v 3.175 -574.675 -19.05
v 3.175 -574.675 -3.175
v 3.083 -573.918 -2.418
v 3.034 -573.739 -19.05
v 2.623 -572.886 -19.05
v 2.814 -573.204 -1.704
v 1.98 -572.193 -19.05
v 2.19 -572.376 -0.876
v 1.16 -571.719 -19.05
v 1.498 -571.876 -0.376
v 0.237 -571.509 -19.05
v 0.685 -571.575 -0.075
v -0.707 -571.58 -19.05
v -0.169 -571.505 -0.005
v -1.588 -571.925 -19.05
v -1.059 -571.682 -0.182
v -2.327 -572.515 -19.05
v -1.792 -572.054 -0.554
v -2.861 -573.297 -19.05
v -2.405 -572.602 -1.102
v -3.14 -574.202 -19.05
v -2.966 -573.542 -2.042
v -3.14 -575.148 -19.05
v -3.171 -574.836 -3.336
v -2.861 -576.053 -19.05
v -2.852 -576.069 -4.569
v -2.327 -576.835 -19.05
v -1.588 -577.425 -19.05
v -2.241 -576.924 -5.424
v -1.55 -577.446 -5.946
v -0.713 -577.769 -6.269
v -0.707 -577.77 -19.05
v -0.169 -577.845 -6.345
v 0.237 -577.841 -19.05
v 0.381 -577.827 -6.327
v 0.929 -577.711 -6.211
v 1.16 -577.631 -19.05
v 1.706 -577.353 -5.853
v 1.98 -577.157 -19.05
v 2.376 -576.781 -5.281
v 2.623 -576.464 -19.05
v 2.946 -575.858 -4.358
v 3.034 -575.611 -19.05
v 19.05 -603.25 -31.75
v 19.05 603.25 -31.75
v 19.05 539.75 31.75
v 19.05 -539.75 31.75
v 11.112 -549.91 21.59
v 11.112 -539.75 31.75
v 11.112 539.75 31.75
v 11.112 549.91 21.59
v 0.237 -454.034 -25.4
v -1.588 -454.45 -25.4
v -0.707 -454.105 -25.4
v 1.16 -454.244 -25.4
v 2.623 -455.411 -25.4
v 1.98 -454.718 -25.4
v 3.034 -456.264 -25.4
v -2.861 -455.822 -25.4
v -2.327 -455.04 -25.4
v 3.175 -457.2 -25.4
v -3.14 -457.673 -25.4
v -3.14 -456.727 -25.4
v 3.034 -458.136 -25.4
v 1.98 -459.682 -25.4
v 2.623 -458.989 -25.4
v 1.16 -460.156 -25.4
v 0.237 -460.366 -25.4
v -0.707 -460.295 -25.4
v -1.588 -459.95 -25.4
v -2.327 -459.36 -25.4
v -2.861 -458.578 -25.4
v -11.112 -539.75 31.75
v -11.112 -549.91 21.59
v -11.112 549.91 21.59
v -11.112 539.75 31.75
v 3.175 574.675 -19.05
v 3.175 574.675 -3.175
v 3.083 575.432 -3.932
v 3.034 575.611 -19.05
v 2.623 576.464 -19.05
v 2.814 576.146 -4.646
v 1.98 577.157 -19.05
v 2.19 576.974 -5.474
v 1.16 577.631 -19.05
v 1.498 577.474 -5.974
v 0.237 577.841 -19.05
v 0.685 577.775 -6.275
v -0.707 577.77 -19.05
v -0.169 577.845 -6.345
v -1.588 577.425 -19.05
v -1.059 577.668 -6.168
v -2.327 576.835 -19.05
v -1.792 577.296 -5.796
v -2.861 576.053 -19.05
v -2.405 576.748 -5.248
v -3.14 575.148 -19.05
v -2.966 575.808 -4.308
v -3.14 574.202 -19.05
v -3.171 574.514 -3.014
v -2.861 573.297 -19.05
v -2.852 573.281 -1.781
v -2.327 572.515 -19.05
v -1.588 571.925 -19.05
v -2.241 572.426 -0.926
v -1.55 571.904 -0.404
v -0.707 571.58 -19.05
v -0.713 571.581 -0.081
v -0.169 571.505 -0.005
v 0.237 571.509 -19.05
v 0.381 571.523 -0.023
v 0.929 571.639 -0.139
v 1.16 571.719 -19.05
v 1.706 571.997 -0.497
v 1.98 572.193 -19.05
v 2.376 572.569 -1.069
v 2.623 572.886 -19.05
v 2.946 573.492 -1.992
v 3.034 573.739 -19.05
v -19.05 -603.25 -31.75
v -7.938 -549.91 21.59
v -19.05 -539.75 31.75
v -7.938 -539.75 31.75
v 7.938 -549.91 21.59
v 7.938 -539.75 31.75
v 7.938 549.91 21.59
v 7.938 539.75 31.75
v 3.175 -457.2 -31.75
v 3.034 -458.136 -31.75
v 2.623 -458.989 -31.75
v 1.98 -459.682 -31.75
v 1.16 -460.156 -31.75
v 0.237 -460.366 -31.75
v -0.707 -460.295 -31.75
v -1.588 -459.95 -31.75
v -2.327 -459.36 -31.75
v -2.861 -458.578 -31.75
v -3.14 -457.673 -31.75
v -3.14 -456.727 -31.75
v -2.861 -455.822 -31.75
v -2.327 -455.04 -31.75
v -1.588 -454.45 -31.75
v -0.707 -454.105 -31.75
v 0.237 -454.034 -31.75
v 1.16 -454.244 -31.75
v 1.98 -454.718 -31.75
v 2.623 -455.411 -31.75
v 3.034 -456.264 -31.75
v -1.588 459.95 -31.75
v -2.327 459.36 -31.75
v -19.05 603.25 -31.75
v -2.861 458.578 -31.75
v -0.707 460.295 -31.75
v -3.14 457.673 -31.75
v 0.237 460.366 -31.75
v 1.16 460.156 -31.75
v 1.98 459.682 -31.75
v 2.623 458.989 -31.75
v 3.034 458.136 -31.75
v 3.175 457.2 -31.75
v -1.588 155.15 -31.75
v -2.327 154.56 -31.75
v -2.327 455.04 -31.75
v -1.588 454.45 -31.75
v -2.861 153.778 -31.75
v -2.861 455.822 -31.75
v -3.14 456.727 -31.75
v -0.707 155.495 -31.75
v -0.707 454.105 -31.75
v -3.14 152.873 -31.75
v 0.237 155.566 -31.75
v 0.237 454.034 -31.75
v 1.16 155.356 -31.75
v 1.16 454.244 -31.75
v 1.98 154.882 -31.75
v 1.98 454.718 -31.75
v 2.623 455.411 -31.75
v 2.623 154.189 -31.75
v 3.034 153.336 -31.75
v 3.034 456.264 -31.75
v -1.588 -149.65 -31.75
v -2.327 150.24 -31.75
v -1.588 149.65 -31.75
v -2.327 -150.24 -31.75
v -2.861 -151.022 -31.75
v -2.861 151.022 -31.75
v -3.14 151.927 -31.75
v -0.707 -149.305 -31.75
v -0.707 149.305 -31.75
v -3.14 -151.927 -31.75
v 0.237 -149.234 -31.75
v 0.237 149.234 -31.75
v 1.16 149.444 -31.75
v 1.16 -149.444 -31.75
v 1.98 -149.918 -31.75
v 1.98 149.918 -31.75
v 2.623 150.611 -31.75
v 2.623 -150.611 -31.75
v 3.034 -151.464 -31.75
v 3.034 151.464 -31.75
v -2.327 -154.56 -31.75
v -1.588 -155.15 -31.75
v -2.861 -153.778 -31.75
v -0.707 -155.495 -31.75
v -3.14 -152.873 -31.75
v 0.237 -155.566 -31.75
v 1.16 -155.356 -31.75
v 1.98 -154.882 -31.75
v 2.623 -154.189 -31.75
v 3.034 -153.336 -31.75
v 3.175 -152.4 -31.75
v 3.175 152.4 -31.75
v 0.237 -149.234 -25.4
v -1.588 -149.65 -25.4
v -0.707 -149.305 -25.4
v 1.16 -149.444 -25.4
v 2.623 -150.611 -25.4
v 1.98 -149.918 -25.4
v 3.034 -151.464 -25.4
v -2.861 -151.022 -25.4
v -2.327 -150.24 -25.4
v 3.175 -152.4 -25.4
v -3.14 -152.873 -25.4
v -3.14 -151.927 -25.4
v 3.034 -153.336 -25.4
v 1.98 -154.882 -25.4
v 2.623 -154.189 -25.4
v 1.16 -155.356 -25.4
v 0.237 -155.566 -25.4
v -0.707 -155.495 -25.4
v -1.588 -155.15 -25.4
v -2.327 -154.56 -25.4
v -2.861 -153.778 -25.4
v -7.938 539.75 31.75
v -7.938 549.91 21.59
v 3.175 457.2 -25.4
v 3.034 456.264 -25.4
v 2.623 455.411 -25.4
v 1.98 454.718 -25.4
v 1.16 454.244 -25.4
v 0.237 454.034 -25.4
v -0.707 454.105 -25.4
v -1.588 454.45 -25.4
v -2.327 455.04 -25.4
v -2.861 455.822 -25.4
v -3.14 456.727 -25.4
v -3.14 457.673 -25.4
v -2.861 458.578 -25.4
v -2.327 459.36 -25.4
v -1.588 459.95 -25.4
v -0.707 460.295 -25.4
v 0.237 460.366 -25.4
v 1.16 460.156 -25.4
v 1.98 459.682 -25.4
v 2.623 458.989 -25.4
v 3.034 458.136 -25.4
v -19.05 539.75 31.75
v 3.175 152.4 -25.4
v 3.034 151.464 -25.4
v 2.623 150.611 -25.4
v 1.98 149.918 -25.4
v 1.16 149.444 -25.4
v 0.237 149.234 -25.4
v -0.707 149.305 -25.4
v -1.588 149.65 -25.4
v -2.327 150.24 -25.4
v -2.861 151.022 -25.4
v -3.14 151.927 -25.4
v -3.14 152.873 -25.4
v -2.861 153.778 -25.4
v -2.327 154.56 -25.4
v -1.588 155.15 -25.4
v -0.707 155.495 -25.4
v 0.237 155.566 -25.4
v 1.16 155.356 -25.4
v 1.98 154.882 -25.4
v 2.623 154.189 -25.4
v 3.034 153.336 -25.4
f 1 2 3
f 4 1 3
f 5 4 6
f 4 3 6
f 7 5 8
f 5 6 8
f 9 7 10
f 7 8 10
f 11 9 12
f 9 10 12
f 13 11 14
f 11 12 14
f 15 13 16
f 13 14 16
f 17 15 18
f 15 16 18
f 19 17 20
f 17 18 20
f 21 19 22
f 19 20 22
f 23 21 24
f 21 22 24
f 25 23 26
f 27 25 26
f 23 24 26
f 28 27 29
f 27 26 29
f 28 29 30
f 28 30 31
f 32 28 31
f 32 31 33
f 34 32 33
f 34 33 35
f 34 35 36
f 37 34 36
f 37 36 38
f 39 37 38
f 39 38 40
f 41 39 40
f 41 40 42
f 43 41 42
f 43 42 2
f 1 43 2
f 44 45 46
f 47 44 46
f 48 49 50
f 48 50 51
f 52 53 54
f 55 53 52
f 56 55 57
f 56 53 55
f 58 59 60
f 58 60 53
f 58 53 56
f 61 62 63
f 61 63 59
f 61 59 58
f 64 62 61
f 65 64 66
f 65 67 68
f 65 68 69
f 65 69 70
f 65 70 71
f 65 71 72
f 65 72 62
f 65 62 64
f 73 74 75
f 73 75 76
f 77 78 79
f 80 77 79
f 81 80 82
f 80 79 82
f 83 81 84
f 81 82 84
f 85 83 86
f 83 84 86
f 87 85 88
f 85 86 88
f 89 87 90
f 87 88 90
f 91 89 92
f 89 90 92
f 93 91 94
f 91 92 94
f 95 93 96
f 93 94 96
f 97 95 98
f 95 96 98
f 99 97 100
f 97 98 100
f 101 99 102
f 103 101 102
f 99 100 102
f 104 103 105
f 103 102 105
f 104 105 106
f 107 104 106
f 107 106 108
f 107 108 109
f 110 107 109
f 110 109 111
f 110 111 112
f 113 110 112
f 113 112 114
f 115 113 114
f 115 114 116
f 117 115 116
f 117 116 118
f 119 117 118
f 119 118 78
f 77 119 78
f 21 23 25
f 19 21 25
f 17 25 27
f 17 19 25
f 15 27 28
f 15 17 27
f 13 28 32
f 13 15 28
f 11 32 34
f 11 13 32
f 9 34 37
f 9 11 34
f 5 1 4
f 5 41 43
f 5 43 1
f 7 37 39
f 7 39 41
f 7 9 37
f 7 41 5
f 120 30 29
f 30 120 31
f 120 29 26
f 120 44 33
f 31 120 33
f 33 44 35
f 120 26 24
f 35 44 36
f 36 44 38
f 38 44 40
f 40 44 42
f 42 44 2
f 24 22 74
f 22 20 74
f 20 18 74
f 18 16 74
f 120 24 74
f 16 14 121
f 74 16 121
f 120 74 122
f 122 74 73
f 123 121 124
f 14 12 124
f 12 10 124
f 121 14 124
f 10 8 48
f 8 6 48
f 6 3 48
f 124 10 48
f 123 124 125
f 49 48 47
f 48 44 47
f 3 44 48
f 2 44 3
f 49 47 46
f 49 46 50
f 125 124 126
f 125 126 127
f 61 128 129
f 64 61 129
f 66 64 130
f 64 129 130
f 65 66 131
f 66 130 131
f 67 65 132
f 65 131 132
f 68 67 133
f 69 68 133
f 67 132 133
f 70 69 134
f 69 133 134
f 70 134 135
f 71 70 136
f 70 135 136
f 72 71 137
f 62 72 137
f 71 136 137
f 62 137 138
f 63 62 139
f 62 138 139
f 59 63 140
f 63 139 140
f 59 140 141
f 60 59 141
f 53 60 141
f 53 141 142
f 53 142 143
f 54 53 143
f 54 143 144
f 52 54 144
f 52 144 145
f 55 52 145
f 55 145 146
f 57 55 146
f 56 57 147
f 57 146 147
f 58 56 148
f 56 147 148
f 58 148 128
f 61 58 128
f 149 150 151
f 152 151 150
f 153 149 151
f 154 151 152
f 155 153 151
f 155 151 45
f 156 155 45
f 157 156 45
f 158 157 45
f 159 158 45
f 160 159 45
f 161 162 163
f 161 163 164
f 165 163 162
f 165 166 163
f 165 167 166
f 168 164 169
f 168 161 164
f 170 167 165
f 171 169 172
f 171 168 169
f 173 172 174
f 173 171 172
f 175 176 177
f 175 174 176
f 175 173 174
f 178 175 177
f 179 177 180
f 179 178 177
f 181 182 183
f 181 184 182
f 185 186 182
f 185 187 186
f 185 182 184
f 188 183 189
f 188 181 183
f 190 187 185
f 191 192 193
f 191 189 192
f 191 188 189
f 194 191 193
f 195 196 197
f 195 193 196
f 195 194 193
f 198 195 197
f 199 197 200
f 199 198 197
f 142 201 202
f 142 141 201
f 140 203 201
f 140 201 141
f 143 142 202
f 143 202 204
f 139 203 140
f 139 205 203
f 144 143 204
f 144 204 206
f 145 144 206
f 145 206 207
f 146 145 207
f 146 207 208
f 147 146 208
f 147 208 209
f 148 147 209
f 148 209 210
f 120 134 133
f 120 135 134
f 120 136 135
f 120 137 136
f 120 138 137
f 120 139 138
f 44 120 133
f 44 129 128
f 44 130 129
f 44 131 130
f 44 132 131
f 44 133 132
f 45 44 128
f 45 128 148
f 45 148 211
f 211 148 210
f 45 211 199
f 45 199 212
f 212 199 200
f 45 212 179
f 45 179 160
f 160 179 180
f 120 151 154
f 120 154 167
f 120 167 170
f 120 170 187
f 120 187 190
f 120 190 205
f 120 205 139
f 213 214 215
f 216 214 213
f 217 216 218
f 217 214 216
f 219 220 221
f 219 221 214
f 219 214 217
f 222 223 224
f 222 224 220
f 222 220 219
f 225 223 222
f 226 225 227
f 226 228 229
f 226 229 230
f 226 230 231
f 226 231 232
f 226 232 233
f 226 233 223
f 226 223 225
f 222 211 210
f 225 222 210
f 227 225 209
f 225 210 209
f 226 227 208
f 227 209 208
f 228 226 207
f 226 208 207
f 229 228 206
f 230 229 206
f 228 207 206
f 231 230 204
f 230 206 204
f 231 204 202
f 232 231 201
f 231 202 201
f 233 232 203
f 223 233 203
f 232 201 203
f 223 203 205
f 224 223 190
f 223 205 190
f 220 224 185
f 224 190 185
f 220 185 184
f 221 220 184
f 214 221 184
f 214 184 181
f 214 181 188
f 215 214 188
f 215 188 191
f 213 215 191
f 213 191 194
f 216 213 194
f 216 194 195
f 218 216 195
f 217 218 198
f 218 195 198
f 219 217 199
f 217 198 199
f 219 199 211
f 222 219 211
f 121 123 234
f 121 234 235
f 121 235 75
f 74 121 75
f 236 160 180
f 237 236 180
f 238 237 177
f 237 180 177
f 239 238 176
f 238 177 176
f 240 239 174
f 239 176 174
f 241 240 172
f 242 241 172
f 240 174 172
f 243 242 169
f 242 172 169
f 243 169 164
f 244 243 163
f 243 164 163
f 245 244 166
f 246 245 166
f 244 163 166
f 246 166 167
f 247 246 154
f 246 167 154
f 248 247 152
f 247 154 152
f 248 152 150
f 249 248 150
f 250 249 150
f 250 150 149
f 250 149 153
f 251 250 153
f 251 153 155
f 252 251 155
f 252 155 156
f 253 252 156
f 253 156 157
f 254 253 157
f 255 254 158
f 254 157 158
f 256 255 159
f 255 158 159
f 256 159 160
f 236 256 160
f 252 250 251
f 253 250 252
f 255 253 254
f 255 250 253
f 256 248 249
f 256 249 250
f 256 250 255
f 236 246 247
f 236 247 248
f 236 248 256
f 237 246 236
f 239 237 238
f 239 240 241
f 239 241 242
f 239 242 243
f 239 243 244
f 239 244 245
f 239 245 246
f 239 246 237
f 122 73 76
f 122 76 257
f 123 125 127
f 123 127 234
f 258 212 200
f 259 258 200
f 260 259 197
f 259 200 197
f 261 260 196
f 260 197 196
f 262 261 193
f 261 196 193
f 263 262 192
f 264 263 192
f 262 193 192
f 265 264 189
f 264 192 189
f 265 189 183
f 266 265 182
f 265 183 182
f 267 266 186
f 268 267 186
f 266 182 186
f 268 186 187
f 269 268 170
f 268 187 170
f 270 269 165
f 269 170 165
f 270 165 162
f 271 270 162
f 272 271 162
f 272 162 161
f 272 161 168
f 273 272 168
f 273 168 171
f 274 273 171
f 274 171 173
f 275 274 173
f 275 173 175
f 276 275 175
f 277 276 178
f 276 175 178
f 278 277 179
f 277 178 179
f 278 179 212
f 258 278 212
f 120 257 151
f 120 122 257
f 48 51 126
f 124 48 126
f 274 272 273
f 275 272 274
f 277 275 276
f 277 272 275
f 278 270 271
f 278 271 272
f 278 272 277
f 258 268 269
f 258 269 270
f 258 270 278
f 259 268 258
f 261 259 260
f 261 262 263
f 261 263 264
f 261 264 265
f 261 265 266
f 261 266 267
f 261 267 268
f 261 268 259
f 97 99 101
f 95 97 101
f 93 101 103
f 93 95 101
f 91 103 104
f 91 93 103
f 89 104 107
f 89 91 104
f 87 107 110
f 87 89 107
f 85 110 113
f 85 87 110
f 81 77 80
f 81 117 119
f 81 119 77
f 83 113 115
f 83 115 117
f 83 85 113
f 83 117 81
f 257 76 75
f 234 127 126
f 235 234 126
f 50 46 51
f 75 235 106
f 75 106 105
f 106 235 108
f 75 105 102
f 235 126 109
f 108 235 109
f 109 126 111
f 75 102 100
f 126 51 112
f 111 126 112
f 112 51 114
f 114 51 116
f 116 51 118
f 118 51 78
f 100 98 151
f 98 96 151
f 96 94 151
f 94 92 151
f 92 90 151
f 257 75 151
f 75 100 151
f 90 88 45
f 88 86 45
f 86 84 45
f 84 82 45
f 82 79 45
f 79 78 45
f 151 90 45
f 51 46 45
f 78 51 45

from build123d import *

# Parameters (mm, degrees)
F1_DEPTH = 603.25
F3_R     = 3.175
F4_DEPTH = 50.8
F5_DEPTH = 50.8
F6_R     = 3.175
F7_DEPTH = 6.35


with BuildPart() as f1:
    # F0 (on Front) → F1 (new body, symmetric)
    with BuildSketch(Plane.XZ):
        Polygon((-19.05, -31.75), (19.05, -31.75), (19.05, 31.75), (11.1125, 31.75), (11.1125, 21.59), (7.9375, 21.59), (7.9375, 31.75), (-7.9375, 31.75), (-7.9375, 21.59), (-11.1125, 21.59), (-11.1125, 31.75), (-19.05, 31.75), align=None)
    extrude(amount=F1_DEPTH, both=True)

    # F3 (on face) → F4 (cut)
    with BuildSketch(Plane.XY.offset(31.75)):
        with Locations((0, 574.675)):
            Circle(F3_R)
        with Locations((0, -574.675)):
            Circle(F3_R)
    extrude(amount=-F4_DEPTH, mode=Mode.SUBTRACT)

    # F2 (on face) → F5 (cut)
    with BuildSketch(Plane.YZ.offset(19.05)):
        Polygon((603.25, 31.75), (539.75, 31.75), (603.25, -31.75), align=None)
        Polygon((-603.25, 31.75), (-603.25, -31.75), (-539.75, 31.75), align=None)
    extrude(amount=-F5_DEPTH, mode=Mode.SUBTRACT)

    # F6 (on face) → F7 (cut)
    with BuildSketch(Plane(origin=(0, 0, -31.75), x_dir=(1, 0, 0), z_dir=(0, 0, -1))):
        with Locations((0, -457.2)):
            Circle(F6_R)
        with Locations((0, -152.4)):
            Circle(F6_R)
        with Locations((0, 152.4)):
            Circle(F6_R)
        with Locations((0, 457.2)):
            Circle(F6_R)
    extrude(amount=-F7_DEPTH, mode=Mode.SUBTRACT)


solid = f1.part
